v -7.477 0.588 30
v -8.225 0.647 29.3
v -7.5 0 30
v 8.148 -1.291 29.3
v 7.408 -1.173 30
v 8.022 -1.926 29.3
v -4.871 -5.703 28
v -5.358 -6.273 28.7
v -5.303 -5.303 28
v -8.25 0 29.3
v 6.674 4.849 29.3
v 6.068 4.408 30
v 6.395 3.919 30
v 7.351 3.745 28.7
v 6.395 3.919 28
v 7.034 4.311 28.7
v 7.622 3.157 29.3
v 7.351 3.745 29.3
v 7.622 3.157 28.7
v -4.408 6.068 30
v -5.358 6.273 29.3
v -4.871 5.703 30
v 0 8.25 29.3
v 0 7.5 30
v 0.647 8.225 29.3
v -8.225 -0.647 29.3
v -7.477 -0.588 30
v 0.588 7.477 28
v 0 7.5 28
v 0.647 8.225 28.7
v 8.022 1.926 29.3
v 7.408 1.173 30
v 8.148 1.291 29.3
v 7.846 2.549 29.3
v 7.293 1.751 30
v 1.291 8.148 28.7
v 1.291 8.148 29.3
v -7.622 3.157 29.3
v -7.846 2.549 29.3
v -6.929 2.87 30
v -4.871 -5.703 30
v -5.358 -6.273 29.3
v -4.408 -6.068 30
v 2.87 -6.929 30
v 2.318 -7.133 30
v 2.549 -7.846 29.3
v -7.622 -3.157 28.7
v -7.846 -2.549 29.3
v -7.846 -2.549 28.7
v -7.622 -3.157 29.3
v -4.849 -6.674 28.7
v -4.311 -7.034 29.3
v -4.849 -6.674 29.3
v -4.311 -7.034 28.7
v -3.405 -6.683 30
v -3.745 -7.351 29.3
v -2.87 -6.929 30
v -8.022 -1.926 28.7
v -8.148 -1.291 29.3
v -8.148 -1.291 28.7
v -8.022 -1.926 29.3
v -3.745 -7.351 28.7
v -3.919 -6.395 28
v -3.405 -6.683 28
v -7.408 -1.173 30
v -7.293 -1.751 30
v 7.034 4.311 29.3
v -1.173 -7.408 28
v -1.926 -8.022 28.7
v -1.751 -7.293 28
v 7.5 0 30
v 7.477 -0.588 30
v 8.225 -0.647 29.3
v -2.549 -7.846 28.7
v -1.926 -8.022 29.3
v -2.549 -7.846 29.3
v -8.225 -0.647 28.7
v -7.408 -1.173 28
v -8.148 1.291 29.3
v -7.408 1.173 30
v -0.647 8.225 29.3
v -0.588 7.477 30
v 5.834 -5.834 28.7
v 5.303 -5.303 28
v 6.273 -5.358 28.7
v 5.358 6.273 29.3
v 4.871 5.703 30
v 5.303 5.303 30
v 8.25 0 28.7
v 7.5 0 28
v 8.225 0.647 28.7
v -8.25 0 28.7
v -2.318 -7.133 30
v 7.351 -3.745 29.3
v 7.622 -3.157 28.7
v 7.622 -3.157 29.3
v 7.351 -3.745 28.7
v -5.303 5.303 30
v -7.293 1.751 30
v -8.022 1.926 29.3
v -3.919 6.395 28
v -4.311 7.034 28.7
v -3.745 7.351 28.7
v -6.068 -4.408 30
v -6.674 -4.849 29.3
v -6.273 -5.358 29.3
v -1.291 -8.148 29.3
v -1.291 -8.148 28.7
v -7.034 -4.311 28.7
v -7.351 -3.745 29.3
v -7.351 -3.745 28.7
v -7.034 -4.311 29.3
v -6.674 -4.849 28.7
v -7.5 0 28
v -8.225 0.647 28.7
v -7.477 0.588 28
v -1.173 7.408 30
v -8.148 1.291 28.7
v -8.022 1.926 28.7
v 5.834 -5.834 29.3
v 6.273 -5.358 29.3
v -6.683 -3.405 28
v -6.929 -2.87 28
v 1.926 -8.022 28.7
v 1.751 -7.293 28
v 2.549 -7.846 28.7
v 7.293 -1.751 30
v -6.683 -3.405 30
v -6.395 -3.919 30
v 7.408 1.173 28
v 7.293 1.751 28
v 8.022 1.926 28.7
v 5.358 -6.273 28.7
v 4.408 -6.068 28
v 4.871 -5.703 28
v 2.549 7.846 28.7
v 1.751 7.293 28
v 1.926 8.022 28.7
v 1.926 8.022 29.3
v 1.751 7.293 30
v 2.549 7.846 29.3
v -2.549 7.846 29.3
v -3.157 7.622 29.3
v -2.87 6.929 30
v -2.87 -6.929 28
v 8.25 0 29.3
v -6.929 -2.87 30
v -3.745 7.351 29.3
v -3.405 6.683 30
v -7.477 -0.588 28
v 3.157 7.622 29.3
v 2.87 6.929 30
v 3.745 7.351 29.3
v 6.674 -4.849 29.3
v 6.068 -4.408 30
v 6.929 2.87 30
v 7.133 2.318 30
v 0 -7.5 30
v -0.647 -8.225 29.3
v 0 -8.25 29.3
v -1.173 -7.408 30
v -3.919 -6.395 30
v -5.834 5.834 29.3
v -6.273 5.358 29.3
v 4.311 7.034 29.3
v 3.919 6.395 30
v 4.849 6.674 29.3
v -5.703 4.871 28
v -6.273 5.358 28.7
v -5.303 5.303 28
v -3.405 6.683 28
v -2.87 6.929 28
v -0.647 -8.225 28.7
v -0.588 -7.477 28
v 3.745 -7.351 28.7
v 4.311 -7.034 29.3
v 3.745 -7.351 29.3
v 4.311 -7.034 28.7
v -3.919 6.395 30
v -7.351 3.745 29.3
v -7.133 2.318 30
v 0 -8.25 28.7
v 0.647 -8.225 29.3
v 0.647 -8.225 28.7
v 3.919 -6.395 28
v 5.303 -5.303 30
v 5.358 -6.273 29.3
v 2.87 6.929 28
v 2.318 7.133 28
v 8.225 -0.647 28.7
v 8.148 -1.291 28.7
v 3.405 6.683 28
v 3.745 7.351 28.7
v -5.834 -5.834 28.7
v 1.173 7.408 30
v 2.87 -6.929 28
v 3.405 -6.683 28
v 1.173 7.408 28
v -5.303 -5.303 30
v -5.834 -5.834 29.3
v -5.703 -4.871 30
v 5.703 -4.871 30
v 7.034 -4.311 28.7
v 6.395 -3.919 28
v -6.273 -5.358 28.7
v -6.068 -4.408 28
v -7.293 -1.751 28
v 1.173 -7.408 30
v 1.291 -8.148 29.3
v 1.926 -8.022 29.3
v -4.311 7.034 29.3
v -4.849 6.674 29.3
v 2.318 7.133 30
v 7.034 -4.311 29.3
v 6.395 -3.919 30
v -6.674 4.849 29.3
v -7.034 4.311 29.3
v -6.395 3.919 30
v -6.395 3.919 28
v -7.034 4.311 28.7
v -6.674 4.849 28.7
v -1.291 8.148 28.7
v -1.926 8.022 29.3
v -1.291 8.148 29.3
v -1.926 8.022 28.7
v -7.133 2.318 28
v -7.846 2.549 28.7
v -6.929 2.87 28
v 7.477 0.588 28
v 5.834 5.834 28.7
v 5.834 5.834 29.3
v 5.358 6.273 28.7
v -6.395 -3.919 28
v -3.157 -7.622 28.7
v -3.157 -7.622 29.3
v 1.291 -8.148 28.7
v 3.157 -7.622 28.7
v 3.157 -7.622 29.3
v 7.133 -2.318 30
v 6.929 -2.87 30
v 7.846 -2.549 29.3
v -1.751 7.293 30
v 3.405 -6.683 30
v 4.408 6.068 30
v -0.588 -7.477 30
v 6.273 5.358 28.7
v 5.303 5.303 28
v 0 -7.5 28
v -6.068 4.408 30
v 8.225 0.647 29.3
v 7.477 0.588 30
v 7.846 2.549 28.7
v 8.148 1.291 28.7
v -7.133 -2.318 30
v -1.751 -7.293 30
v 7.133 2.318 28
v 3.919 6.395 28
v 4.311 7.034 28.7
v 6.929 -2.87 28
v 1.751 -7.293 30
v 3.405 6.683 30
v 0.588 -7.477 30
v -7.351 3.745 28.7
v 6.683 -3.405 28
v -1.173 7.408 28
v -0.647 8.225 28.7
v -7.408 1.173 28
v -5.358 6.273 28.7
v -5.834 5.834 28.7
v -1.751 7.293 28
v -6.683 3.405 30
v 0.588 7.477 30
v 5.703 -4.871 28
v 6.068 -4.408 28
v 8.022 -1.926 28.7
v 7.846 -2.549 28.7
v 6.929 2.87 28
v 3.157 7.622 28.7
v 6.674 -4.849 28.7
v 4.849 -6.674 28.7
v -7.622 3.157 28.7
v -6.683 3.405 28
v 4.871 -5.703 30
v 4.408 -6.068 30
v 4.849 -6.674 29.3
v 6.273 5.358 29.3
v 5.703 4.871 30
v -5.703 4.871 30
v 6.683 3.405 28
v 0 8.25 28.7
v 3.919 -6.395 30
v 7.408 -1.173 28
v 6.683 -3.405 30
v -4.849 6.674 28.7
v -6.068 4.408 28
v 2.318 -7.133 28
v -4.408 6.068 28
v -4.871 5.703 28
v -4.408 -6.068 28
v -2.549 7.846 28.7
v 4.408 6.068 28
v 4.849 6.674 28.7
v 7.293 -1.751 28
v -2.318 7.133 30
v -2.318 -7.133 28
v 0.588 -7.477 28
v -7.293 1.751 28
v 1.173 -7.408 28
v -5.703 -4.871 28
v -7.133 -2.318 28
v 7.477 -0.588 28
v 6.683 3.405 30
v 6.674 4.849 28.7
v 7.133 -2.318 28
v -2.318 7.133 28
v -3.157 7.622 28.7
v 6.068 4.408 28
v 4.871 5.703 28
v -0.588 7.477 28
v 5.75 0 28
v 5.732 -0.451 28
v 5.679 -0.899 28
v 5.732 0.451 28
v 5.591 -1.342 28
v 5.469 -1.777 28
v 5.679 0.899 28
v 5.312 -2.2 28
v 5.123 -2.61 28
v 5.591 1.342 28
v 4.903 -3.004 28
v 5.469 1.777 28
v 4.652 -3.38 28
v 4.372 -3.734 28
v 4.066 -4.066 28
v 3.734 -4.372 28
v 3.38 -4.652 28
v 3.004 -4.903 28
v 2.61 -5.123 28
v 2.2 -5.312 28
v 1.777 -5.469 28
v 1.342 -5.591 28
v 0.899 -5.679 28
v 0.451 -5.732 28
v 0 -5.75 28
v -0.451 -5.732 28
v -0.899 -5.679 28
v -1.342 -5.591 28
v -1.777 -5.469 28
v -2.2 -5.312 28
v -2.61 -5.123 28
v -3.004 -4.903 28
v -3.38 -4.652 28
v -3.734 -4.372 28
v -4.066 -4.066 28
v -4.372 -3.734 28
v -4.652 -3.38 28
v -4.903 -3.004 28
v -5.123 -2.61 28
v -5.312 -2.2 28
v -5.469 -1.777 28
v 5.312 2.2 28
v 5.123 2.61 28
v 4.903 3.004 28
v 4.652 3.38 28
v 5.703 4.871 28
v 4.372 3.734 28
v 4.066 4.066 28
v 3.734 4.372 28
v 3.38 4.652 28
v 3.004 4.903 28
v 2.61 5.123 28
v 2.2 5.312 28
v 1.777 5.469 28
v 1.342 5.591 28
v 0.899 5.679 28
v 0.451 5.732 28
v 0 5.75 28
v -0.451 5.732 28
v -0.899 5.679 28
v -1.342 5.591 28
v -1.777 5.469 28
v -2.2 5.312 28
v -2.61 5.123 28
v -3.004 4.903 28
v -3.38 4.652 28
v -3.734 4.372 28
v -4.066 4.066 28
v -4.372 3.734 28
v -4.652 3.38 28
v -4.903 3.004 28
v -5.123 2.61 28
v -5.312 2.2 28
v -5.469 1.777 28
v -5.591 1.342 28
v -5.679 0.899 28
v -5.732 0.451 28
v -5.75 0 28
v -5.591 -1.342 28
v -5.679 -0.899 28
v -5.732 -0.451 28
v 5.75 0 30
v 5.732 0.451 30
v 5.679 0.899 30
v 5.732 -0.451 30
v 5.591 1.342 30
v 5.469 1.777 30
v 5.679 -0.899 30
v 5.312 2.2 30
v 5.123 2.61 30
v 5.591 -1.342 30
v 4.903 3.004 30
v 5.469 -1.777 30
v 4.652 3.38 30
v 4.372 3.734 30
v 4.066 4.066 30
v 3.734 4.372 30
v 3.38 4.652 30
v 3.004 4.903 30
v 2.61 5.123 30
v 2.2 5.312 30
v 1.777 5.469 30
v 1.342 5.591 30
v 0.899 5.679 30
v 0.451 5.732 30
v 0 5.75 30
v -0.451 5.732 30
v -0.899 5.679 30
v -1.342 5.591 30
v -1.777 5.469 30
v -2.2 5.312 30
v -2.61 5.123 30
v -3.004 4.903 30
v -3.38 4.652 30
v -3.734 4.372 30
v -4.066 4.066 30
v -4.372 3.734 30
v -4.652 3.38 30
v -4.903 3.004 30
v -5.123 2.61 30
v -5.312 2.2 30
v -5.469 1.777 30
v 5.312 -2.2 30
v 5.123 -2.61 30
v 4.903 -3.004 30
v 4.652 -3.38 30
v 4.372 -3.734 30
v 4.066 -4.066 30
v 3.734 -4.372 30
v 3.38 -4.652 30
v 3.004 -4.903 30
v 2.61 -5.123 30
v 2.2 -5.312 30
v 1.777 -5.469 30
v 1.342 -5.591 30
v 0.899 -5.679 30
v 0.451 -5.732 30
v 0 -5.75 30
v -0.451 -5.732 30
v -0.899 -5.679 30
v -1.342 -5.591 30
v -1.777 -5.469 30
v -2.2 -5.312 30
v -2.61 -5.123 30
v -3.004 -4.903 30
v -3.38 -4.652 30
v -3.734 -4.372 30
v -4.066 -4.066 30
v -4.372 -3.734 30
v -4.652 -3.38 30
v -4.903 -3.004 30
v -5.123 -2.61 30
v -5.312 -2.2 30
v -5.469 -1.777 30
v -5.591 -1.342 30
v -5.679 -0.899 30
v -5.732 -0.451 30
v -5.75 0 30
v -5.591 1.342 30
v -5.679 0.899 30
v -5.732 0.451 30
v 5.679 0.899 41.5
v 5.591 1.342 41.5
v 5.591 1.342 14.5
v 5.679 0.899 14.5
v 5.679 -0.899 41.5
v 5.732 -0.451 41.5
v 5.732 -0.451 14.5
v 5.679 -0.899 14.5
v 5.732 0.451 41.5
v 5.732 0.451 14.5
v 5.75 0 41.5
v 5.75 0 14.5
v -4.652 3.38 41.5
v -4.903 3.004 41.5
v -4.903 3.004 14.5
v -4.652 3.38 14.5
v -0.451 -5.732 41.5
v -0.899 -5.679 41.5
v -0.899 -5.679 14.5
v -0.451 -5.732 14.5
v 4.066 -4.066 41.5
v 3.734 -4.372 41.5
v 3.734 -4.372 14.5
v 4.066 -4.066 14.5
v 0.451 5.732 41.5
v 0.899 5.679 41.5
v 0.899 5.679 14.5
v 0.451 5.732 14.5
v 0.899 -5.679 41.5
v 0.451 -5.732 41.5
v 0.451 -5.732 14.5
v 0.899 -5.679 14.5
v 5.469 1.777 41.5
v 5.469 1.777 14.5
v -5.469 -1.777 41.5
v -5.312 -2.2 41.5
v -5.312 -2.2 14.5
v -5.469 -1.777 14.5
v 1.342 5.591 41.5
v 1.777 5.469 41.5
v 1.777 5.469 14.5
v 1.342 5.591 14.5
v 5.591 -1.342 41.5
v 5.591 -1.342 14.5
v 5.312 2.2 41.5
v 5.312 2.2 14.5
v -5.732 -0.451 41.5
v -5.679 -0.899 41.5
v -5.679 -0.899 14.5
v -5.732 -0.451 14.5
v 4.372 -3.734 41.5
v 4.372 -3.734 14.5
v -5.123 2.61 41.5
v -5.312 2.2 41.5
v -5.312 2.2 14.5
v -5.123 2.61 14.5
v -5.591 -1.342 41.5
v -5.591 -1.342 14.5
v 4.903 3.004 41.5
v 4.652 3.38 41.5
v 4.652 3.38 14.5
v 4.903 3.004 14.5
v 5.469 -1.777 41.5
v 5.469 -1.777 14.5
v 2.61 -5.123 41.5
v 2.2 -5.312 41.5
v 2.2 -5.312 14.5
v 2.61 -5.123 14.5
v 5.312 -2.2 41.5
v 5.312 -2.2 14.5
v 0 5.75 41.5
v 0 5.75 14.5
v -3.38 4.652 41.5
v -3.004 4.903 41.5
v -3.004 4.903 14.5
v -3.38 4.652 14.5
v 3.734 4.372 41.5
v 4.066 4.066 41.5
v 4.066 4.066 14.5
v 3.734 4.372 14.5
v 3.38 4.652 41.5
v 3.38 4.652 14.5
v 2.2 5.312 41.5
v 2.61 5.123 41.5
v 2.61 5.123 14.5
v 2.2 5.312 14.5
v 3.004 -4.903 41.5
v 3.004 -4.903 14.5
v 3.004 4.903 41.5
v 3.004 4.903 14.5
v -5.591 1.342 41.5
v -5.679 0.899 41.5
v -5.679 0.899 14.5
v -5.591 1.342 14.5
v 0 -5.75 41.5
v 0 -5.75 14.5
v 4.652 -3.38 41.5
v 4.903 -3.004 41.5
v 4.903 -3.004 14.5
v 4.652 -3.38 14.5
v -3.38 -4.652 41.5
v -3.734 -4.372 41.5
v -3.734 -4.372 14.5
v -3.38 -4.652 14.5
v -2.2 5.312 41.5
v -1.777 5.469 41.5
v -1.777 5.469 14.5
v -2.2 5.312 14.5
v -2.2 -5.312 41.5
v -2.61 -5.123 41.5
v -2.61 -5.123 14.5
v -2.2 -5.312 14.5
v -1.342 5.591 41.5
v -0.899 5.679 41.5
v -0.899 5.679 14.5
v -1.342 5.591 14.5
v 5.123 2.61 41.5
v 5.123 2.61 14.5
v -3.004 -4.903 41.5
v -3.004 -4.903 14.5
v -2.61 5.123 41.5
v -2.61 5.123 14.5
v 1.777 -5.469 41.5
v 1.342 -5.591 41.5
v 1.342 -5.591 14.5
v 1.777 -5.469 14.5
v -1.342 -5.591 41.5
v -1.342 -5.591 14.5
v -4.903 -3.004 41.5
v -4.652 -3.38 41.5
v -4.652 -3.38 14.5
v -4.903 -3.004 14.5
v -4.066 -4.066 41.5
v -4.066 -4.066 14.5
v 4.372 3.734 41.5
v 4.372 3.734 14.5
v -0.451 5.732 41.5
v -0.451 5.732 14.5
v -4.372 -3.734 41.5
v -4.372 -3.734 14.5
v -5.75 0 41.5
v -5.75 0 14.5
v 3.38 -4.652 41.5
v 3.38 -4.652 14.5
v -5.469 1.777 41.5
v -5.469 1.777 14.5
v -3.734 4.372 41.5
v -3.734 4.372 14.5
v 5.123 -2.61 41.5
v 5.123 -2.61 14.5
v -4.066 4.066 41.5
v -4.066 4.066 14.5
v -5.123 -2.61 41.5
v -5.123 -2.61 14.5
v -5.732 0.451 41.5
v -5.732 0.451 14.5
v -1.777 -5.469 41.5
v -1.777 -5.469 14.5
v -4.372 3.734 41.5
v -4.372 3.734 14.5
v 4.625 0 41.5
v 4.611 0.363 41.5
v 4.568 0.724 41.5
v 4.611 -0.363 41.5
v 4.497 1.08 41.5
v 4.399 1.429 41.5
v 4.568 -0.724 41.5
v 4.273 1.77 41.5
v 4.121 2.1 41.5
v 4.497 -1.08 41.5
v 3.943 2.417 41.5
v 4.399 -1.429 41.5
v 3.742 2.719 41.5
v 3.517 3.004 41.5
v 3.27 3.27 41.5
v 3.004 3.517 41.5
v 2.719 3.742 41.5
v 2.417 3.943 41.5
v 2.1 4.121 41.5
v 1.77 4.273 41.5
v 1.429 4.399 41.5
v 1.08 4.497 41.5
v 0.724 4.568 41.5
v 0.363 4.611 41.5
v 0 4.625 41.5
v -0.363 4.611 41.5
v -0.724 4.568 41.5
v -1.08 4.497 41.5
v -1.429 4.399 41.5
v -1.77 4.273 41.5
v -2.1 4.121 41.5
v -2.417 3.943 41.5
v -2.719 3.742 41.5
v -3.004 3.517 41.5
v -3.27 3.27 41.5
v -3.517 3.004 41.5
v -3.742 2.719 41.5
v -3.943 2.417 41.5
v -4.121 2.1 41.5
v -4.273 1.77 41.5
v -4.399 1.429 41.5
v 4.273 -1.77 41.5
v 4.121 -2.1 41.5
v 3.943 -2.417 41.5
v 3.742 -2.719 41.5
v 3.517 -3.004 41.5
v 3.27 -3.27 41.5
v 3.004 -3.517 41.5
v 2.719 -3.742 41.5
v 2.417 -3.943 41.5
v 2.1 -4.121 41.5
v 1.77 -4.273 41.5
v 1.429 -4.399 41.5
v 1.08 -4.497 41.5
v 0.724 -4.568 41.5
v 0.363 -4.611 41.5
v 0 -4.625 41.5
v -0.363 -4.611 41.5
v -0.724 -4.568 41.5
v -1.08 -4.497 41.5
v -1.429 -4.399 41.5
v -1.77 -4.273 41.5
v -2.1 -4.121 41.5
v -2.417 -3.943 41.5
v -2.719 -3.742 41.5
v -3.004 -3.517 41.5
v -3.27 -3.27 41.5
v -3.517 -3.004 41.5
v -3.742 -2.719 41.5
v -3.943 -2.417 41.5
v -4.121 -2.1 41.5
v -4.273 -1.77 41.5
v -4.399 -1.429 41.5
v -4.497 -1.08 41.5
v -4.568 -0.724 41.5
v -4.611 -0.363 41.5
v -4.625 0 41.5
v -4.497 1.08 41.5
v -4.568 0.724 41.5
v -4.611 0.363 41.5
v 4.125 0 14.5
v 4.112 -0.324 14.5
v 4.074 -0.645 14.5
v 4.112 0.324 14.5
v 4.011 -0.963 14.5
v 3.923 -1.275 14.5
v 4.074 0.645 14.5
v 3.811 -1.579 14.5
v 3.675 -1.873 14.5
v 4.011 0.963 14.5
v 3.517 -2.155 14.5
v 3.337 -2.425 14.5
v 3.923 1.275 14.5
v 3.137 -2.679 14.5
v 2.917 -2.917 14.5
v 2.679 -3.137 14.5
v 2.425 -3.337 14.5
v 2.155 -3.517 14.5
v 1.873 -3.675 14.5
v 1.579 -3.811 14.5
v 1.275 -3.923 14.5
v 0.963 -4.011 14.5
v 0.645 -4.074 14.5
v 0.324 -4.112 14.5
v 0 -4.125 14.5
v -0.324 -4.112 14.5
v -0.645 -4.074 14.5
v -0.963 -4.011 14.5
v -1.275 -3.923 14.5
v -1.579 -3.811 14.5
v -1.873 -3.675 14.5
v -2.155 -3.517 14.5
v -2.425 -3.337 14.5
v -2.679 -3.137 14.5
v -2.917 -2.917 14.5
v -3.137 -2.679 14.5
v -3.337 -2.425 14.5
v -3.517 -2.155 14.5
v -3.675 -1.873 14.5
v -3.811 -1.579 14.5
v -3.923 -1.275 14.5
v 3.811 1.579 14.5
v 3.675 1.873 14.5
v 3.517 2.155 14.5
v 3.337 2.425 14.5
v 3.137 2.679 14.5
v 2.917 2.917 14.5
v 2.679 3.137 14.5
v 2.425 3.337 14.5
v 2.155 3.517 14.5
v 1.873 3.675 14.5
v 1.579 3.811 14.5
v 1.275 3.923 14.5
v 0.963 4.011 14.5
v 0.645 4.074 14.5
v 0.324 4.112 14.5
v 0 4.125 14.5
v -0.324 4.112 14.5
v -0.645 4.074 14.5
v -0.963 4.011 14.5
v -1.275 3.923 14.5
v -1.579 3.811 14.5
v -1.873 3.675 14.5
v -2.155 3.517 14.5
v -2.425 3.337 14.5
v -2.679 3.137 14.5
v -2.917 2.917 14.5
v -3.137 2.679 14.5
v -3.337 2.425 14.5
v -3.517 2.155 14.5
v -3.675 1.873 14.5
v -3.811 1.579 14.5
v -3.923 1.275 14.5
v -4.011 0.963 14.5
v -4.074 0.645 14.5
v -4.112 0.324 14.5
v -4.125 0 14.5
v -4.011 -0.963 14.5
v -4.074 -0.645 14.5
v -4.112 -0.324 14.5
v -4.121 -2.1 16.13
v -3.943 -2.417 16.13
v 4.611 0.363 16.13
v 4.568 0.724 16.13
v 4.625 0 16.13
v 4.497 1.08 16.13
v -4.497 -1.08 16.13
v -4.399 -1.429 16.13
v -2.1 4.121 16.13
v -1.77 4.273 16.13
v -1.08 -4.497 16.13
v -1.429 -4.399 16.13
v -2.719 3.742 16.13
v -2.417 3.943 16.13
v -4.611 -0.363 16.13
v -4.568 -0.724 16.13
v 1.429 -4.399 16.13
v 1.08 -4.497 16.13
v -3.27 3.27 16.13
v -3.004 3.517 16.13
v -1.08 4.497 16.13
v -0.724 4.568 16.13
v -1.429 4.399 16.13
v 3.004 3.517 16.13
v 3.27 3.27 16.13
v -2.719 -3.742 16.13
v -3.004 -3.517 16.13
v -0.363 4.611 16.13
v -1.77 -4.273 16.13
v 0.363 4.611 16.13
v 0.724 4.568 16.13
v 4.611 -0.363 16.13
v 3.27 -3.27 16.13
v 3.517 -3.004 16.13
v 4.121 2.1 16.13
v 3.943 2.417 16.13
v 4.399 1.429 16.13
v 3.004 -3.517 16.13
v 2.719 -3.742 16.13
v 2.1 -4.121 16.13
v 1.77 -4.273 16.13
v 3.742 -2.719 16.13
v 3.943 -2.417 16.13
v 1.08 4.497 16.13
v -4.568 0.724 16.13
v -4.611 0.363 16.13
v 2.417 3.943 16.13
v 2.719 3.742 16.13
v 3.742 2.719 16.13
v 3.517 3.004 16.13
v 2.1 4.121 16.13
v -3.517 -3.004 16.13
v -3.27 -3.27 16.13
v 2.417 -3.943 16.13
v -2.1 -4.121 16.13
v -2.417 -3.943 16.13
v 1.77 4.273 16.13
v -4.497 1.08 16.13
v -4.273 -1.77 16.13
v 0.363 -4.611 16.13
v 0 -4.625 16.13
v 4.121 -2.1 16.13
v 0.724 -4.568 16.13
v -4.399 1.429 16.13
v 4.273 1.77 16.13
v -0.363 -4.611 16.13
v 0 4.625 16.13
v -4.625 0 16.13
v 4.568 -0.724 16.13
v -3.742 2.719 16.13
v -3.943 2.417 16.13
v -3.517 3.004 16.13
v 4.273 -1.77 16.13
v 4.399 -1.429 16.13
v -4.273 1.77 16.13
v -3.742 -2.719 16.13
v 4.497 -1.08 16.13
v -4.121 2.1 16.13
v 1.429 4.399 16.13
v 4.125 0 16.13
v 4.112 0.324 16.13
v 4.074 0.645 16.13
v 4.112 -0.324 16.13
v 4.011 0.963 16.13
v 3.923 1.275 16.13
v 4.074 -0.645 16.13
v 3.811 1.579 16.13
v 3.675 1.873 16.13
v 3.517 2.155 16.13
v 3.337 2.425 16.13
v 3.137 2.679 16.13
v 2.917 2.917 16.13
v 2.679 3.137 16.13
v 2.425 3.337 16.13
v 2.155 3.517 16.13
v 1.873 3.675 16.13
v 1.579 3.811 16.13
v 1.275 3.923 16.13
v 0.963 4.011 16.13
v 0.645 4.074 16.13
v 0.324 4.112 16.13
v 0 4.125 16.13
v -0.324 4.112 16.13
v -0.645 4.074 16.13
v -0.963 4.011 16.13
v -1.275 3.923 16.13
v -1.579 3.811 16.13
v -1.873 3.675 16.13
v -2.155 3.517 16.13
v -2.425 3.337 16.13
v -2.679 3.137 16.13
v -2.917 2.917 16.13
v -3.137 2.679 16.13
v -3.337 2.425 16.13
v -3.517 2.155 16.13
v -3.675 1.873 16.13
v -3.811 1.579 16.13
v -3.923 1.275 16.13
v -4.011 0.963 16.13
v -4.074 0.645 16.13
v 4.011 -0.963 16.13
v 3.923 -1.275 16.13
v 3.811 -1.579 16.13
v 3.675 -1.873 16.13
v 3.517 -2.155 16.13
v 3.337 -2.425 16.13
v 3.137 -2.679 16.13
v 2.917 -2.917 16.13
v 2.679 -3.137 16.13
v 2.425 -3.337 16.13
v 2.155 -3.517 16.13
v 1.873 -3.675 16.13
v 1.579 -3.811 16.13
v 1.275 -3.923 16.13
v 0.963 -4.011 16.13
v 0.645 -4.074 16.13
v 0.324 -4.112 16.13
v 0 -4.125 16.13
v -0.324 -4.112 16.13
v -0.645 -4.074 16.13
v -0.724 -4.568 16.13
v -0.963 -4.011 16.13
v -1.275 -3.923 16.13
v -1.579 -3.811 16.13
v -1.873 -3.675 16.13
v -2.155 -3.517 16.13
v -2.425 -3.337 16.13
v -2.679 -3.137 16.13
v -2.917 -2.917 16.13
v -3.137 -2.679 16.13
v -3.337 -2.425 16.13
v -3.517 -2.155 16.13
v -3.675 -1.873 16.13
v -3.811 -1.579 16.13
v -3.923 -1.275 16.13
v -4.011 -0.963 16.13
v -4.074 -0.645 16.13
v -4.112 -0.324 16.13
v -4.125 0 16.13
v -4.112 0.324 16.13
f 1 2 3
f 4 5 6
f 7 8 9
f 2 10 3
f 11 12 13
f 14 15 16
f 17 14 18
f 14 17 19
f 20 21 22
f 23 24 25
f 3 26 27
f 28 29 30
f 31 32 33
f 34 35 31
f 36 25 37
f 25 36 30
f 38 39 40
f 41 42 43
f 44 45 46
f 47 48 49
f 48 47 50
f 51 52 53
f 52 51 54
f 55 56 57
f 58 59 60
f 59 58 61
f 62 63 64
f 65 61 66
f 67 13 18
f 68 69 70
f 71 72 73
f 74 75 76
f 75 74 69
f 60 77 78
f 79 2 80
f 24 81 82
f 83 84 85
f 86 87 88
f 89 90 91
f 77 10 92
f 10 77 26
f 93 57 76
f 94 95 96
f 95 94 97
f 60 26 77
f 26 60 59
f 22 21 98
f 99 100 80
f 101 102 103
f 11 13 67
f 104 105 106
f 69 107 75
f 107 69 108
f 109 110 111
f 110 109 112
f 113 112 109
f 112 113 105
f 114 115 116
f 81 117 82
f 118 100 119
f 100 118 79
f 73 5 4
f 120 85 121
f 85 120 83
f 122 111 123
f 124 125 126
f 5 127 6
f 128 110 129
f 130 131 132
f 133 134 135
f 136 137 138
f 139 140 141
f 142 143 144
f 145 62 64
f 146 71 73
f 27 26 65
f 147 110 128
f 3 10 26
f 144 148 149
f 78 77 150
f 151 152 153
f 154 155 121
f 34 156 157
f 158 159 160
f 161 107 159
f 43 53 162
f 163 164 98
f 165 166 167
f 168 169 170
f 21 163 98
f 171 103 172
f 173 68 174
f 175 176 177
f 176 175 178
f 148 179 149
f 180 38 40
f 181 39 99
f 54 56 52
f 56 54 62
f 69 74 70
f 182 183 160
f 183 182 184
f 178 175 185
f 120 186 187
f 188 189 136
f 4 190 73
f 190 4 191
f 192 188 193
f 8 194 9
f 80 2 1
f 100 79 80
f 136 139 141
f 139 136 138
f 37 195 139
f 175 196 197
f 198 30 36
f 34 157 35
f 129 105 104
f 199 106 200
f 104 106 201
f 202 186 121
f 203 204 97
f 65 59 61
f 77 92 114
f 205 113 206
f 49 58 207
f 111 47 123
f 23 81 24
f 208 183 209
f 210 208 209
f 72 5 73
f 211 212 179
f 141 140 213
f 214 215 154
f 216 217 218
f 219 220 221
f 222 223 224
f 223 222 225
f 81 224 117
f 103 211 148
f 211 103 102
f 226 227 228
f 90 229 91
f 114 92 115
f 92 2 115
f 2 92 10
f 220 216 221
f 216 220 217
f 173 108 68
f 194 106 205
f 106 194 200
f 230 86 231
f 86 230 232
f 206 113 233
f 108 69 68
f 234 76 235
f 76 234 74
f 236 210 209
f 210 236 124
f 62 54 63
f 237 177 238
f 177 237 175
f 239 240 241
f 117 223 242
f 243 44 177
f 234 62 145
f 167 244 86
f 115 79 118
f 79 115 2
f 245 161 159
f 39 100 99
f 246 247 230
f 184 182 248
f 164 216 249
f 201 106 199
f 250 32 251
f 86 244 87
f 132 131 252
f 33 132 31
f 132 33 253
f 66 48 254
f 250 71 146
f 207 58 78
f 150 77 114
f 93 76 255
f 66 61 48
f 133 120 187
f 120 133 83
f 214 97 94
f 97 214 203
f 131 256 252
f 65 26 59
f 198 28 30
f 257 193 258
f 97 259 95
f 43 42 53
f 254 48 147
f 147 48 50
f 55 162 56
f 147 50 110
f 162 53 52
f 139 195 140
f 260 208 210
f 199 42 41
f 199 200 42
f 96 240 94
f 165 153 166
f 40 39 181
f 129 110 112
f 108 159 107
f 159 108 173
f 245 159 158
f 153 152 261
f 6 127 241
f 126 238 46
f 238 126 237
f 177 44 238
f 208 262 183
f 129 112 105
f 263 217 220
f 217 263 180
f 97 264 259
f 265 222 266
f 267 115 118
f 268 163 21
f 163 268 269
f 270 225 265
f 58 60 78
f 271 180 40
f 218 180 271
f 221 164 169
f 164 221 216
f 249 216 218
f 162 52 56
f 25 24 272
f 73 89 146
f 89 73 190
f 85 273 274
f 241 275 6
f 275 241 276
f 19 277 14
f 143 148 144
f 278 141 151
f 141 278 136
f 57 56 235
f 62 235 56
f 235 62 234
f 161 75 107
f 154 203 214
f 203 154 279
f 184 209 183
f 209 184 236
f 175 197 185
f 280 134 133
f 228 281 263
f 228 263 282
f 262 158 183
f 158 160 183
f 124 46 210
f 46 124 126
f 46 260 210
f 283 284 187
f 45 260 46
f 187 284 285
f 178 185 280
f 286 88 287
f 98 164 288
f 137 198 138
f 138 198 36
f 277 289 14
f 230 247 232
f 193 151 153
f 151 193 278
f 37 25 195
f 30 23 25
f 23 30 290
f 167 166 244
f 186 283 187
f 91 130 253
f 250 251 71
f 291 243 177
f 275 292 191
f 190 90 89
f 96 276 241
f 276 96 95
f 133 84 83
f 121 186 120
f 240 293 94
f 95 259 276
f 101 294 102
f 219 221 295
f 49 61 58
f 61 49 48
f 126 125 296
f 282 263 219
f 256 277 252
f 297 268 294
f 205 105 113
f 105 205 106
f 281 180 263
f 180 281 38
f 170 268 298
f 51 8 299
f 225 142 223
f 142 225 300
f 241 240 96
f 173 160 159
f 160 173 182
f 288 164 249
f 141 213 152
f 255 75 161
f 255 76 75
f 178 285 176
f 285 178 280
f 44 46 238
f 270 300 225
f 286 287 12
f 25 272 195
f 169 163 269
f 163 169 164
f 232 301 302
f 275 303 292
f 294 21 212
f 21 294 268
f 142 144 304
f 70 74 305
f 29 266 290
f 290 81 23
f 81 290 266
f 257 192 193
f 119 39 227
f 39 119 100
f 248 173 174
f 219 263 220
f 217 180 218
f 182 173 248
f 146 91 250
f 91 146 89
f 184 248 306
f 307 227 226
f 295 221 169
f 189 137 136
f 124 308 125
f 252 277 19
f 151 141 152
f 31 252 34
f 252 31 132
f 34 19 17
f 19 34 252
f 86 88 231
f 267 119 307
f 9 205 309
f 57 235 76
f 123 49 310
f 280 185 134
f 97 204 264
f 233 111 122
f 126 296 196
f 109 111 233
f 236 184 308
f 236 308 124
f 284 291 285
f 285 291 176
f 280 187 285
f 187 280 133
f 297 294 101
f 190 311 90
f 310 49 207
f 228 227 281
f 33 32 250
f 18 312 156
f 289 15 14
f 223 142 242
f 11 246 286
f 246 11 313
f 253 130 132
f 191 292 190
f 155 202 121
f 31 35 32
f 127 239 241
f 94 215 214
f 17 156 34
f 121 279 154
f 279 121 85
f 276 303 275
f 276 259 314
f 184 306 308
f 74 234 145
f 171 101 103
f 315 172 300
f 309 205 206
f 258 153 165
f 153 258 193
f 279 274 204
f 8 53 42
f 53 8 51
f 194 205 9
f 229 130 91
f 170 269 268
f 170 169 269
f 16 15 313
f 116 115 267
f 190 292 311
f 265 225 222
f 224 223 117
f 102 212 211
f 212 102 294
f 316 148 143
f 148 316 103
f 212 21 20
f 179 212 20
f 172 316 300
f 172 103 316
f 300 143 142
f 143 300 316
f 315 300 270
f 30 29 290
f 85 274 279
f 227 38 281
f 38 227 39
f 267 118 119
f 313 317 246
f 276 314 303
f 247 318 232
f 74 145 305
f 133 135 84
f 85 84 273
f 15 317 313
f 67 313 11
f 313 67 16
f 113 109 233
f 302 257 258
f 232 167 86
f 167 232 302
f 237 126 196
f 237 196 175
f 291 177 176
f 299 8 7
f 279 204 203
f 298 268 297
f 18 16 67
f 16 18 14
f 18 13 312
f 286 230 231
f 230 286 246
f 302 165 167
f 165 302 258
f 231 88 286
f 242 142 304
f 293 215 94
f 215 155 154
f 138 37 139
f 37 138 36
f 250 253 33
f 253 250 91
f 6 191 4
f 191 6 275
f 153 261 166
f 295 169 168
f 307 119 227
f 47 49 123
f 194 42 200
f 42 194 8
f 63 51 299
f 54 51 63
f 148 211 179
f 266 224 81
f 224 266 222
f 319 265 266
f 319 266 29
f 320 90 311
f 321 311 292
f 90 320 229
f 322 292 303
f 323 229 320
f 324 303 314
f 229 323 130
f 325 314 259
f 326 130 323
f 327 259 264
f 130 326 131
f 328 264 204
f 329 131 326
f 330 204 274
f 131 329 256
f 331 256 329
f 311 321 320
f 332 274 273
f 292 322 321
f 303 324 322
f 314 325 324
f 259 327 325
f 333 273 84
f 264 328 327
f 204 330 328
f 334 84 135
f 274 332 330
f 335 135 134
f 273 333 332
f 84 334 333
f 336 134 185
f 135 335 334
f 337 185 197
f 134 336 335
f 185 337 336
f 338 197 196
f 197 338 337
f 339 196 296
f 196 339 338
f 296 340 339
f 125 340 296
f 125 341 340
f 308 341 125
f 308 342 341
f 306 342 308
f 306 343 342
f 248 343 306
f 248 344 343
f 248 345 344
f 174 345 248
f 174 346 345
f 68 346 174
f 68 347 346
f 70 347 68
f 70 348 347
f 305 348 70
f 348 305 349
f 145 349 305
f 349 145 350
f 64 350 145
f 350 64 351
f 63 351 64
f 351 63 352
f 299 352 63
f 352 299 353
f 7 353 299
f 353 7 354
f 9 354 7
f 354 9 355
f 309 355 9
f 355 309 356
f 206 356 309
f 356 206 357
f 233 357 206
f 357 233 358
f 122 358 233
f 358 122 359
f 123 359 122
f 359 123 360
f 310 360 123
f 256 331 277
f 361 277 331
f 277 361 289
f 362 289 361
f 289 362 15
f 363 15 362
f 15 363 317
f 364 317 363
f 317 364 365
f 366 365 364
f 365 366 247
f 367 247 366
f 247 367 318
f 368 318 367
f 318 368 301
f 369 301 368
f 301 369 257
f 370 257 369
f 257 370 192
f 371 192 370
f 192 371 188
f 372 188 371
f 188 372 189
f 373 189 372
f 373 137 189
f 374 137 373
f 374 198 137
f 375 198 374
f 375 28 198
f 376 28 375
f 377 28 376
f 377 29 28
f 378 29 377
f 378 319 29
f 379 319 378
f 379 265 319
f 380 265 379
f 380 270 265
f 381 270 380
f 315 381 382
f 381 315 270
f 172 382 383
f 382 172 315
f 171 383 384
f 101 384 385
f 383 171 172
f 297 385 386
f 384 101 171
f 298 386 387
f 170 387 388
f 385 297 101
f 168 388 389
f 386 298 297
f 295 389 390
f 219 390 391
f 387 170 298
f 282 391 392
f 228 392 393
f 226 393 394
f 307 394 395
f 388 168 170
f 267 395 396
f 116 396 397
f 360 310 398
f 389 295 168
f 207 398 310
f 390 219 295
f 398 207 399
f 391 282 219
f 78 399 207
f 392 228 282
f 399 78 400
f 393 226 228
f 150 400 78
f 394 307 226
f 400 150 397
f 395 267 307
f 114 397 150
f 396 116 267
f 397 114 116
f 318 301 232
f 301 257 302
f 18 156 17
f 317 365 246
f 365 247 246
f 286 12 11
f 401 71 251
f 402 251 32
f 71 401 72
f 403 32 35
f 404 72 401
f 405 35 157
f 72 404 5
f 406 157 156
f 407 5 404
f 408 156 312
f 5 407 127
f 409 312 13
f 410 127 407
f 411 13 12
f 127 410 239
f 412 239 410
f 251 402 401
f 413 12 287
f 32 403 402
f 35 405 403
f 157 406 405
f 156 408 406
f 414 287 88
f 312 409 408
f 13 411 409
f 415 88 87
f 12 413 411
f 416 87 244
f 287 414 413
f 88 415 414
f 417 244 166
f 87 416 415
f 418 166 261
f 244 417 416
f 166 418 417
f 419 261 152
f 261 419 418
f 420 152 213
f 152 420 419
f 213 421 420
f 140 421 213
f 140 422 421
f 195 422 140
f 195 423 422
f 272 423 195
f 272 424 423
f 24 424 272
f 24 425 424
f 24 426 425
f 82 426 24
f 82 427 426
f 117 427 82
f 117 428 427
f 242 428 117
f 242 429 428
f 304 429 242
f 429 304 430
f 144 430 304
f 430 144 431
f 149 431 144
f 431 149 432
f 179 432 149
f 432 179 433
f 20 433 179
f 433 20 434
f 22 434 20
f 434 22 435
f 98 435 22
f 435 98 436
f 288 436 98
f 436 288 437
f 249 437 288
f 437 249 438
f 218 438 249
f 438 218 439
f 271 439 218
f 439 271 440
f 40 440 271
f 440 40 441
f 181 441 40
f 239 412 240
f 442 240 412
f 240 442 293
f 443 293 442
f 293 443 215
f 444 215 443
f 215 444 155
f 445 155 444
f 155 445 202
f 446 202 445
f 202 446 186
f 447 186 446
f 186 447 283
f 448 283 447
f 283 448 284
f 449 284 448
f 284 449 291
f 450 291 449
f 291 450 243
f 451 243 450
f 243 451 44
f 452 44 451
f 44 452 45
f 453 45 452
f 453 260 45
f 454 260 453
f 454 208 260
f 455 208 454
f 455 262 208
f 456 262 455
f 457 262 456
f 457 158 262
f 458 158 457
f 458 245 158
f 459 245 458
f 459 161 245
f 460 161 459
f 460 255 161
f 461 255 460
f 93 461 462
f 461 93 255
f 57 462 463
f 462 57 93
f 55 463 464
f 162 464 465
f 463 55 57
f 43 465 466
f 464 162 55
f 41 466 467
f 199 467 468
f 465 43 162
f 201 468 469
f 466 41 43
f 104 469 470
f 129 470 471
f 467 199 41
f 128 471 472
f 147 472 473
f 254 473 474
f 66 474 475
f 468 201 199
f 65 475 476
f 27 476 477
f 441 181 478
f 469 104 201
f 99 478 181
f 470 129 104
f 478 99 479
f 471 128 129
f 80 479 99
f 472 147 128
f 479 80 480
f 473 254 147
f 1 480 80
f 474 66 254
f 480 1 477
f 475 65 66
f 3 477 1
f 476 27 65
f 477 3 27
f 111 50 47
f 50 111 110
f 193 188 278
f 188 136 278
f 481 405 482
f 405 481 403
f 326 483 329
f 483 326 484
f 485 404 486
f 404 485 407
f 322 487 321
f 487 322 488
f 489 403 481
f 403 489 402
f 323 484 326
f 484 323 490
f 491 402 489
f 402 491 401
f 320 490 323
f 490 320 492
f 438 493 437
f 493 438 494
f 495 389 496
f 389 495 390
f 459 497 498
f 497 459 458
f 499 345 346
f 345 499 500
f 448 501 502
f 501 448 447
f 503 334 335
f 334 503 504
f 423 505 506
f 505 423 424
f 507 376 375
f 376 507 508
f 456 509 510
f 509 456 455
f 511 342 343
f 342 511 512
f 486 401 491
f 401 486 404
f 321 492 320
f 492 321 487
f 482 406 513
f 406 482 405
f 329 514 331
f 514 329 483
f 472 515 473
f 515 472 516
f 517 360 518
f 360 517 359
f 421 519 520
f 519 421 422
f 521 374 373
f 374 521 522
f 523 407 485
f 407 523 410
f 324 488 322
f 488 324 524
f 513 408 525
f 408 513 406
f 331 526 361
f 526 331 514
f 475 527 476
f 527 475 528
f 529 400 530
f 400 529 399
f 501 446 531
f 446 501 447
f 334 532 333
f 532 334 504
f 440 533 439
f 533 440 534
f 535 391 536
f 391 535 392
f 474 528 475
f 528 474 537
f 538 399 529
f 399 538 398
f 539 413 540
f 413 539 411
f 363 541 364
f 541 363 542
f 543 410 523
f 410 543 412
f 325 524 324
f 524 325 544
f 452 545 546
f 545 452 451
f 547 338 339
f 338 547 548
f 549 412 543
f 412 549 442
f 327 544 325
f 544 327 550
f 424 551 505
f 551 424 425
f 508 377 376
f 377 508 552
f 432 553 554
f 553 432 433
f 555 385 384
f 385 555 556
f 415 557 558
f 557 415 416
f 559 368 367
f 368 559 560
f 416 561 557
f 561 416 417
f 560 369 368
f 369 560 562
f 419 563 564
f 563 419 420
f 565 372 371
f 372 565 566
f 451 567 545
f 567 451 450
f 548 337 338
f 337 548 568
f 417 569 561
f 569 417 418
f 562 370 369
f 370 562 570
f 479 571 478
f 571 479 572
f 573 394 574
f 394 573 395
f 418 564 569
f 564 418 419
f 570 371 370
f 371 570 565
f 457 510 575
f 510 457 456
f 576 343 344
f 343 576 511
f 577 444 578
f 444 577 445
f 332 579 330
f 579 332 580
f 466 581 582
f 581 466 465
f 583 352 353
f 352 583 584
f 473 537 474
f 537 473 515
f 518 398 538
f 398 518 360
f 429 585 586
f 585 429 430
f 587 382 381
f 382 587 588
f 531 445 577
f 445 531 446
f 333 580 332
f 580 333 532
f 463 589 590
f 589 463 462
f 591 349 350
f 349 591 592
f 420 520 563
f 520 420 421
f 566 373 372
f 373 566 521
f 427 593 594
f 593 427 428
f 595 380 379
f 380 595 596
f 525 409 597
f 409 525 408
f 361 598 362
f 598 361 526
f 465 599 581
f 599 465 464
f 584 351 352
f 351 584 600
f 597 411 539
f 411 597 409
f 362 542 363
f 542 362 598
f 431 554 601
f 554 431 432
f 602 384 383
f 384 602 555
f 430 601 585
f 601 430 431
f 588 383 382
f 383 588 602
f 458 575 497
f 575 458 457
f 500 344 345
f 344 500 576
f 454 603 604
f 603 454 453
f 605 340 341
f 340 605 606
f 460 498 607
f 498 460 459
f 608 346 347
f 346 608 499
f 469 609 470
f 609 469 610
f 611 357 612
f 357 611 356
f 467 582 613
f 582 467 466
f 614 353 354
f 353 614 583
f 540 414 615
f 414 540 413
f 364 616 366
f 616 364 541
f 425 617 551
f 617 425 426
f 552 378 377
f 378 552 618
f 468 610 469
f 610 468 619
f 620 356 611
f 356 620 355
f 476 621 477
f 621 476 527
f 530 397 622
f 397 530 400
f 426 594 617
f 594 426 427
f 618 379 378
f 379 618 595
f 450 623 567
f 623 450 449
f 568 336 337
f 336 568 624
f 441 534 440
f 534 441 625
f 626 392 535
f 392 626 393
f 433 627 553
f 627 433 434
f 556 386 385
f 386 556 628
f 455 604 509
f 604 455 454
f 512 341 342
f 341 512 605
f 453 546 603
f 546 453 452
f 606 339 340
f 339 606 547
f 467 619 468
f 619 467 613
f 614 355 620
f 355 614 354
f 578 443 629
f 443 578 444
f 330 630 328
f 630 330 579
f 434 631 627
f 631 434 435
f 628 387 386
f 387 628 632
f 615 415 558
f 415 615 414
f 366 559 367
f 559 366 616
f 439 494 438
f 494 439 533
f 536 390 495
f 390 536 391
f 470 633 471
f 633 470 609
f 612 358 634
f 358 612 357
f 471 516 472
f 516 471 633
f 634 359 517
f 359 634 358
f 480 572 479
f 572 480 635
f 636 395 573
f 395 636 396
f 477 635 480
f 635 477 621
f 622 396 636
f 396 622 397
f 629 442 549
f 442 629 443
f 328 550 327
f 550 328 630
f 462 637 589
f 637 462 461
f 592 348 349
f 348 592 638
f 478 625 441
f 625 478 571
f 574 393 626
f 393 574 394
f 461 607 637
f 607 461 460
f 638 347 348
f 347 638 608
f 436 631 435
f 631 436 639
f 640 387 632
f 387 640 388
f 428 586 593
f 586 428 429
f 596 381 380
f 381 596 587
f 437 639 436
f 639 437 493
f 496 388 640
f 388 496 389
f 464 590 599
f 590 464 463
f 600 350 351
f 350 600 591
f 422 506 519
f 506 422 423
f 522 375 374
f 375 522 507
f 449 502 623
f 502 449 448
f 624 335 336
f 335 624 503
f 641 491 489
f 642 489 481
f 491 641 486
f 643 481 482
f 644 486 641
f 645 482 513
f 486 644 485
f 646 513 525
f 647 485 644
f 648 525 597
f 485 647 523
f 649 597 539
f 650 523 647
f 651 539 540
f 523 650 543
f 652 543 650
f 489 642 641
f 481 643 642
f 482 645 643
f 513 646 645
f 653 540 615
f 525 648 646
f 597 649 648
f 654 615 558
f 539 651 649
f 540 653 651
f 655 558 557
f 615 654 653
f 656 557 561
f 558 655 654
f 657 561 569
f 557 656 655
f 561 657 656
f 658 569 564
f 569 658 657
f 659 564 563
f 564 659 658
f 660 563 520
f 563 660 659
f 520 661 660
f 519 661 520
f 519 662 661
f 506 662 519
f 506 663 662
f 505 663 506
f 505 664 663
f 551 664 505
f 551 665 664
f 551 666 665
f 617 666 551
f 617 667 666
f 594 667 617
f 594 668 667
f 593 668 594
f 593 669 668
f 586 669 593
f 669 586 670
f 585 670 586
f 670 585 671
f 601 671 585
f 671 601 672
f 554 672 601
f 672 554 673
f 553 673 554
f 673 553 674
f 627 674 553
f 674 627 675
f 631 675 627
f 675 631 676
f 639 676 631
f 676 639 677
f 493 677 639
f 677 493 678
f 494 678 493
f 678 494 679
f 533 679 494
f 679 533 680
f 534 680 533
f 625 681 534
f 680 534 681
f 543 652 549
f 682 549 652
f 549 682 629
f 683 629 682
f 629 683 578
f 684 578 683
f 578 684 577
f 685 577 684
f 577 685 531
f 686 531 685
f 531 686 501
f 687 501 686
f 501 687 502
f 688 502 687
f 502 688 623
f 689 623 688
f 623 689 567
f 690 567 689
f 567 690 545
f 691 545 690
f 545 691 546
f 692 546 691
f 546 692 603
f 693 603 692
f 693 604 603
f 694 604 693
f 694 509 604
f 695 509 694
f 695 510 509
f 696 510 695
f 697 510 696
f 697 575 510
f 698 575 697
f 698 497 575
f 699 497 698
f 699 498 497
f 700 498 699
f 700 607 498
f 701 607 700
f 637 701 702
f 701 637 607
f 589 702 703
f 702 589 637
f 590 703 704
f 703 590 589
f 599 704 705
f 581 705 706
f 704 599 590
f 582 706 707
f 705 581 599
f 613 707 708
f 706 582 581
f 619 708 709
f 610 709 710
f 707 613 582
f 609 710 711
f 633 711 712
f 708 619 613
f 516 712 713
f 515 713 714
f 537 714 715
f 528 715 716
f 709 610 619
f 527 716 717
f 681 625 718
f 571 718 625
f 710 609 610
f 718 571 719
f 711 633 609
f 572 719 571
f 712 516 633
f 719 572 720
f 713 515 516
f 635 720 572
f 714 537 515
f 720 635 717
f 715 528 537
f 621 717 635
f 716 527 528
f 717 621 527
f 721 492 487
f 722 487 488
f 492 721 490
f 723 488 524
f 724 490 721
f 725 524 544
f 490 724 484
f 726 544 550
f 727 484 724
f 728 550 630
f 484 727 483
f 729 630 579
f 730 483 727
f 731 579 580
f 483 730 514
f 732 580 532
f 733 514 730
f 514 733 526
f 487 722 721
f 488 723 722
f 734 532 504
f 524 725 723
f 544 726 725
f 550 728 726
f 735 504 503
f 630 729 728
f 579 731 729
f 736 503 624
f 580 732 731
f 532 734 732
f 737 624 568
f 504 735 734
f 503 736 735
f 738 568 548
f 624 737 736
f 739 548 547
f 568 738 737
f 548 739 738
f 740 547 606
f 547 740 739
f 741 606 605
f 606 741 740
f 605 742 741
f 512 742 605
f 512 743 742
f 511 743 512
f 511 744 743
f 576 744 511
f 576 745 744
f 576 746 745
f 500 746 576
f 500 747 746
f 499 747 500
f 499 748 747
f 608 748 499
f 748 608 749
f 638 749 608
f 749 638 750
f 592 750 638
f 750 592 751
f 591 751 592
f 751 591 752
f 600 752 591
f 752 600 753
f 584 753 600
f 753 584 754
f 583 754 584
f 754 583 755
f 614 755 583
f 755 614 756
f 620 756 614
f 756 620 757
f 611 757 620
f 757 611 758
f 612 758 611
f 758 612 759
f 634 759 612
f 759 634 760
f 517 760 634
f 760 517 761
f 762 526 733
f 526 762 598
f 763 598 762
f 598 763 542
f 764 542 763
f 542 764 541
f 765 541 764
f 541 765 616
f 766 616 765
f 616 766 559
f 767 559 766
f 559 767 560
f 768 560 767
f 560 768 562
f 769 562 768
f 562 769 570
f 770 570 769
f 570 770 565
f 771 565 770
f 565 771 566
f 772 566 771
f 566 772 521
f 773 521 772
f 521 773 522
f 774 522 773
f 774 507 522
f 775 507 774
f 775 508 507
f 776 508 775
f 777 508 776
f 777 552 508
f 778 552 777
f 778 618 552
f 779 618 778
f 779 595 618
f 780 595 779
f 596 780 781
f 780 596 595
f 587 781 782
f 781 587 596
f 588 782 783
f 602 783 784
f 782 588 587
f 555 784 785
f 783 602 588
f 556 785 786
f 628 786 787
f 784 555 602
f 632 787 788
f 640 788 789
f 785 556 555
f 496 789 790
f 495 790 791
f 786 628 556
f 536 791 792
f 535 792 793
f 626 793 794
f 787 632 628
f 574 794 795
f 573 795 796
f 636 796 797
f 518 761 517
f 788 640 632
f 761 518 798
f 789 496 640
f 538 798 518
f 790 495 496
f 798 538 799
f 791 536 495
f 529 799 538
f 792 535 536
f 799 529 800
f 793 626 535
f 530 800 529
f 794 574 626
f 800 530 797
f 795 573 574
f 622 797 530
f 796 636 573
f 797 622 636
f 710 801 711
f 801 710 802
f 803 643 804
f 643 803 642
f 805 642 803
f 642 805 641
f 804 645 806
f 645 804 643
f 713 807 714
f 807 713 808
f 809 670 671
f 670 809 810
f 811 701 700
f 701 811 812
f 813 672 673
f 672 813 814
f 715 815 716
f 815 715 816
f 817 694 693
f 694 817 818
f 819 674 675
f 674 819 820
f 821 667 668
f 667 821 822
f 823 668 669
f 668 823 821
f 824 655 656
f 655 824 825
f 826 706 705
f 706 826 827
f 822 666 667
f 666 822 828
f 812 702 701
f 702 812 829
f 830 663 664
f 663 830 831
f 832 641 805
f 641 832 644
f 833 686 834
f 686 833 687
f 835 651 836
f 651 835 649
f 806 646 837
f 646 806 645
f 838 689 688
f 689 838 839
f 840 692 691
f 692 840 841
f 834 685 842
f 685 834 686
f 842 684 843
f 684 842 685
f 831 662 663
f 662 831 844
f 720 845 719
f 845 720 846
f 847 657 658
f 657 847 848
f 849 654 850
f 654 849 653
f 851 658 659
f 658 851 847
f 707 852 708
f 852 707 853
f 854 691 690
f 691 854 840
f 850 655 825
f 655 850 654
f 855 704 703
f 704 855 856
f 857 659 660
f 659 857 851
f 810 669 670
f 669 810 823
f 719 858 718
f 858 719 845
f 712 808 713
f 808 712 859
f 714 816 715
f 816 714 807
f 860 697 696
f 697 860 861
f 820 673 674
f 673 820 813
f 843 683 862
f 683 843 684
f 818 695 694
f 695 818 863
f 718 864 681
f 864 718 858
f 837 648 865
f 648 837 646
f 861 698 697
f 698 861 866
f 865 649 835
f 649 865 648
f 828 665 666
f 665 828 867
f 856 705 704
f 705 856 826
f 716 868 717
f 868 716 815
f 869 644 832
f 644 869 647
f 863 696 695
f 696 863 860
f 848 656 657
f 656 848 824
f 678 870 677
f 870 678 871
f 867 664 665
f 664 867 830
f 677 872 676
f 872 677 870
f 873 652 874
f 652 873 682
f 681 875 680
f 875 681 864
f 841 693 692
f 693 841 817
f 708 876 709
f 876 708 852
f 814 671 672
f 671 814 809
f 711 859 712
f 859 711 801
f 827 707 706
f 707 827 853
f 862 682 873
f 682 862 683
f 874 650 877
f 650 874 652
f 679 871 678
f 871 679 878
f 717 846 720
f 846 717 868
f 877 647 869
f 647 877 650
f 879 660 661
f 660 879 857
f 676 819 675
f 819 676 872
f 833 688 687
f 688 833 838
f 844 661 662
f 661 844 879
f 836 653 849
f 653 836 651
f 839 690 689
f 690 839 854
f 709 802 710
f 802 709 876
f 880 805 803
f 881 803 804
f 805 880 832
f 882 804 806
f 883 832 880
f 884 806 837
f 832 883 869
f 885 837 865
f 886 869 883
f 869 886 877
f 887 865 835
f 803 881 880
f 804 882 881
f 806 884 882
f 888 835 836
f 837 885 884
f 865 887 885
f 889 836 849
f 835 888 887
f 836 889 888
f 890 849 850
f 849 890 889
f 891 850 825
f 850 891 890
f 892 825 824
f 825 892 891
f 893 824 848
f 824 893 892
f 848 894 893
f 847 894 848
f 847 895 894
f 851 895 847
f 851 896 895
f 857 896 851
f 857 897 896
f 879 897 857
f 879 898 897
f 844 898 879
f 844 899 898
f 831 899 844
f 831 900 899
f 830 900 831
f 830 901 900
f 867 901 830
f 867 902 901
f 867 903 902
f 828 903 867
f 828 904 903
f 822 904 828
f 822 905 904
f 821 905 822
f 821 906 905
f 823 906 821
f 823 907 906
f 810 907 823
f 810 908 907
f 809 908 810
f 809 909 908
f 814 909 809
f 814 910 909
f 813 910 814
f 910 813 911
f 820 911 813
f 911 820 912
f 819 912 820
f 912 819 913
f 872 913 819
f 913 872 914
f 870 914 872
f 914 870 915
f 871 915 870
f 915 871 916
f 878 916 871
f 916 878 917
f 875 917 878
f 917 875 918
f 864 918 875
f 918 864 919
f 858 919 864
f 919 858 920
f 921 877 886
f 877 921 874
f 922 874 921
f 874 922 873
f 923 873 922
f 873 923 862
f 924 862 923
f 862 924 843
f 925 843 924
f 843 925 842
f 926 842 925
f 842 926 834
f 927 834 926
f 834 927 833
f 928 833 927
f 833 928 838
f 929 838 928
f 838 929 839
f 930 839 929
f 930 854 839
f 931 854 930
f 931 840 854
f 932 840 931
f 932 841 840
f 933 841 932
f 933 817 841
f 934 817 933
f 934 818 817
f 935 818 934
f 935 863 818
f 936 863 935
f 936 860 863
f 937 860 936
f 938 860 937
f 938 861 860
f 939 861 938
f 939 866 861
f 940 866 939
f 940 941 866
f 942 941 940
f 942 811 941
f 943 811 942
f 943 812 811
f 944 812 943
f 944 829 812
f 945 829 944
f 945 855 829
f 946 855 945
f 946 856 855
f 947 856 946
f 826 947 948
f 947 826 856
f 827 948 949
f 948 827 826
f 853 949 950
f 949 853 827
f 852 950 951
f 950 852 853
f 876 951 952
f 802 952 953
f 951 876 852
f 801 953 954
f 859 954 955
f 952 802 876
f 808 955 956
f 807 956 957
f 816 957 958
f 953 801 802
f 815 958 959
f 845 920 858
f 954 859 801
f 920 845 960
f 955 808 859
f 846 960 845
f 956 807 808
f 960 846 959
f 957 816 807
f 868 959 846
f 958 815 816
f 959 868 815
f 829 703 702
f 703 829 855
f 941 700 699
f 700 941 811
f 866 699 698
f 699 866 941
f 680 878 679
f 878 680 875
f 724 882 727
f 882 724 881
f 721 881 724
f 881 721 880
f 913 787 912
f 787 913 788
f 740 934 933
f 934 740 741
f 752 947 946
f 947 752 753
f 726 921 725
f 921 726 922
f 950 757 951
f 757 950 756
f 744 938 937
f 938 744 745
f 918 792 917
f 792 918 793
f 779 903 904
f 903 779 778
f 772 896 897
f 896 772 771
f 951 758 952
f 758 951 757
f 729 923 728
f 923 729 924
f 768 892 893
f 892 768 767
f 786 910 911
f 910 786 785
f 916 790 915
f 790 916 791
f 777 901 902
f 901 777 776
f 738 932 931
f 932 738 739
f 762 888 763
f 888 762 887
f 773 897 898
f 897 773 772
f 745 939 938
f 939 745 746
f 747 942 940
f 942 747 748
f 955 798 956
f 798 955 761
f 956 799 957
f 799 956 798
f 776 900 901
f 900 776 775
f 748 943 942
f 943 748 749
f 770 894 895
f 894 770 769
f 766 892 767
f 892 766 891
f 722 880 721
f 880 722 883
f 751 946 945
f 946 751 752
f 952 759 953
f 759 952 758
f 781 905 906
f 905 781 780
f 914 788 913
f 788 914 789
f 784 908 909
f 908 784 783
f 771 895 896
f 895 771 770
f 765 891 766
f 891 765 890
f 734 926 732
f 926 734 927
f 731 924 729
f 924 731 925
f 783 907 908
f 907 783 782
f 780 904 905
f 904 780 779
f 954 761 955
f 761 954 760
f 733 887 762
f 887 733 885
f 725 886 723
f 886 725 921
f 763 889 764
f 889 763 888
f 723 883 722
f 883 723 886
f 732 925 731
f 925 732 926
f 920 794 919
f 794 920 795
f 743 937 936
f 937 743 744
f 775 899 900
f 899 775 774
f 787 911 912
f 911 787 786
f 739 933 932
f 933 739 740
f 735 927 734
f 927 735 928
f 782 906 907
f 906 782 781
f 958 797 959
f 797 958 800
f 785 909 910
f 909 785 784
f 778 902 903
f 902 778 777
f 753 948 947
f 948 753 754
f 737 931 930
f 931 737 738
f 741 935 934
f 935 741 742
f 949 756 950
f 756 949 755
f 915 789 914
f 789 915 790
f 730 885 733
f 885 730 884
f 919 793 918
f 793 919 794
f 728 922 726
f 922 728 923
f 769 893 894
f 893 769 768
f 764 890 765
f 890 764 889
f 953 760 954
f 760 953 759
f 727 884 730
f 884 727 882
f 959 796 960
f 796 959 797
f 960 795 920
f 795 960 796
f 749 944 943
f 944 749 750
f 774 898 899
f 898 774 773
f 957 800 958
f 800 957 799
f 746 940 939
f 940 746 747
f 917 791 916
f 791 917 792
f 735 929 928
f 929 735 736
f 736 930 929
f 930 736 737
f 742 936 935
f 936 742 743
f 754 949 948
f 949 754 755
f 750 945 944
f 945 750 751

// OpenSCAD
// file: plotter_pen_adapters_common.scad
// Measurements and routines common across adapters.

band_full_thickness = 2;    // thickest point of the band
band_edge_thickness = 0.6;  // thinnest point of the band
band_full_diameter = 16.5;  // diameter at widest point of band
band_edge_diameter = 15;    // diameter where band starts to angle in

band_to_paper = 28 ;

band_to_body_tapering = 11 ; 

body_taper = 5 ; //fake value ;

band_profile = [
    [0,0],
    [band_edge_diameter / 2, 0],
    [band_full_diameter / 2, (band_full_thickness - band_edge_thickness) / 2],
    [band_full_diameter / 2, band_full_thickness - ((band_full_thickness - band_edge_thickness) / 2)],
    [band_edge_diameter / 2, band_full_thickness],
    [0,band_full_thickness],
];

module band() {
    rotate_extrude($fn=80) polygon(points=band_profile);
}



//-- Original HP plotter pen, which now serves as a body for the actual pen
 
BodyOutline = [                     // X values = (measured diameter)/2, Y as distance from tip
    [0.0,0.0],                      //  0 fiber pen tip
//  [2.0/2,1.4],                    //  1 ... taper (not buildable)
    [1.0/2,0.005],                  //  1 ... faked point to remove taper
    [2.0/2,0.0],[2.0/2,2.7],        //  2 ... cylinder
    [3.7/2,2.7],[3.7/2,4.45],       //  4 tip surround
    [4.8/2,5.2],                    //  6 chamfer
    [6.5/2,11.4],                   //  7 rubber seal face
    [8.9/2,11.4],                   //  8 cap seat
    [11.2/2,15.9],                  //  9 taper to body
    [11.5/2,28.0],                  // 10 lower body
    [13.2/2,28.0],[16.6/2,28.5],    // 11 lower flange = 0.5
    [16.6/2,29.5],[13.2/2,30.0],    // 13 flange rim = 1.0
    [11.5/2,30.0],                  // 15 upper flange = 0.5
    [11.5/2,43.25],                 // 16 upper body
    [0.0,43.25]                     // 17 lid over reservoir
    ];
    
    
    
 //-- HP plotter pen body
 
module Body() {
    render(convexity=3)
        rotate_extrude($fn=50)
            polygon(points=BodyOutline);
}

    
// main file
// Plotter pen adapter for Muji black 0.5 pen
// 
// Refactored by Julien Dorra
// Original code by Sasha Kovar <sasha-thing@arcocene.org>
// from a design by Brian Boucheron <brian@boucheron.org>

include <plotter_pen_adapters_common.scad>;

adapter_outer_diameter = 11.5; // outer diameter of the main body

pen_top_diameter = 9.25; 
pen_bottom_diameter = 8.25; //make it smaller to stop the pen. Might not be needed if you just want the pen to press down thanks to gravity

pen_height_of_diameter_change = 16.13 ; // this is usually the body/cap limit on the body of the pen

adapter_height_above_band = 13.5;
adapter_height_below_band = 13.5;

module adapter_body () {
translate([0,0,band_to_paper])  
    union() {
        band();
        cylinder(r=adapter_outer_diameter/2, h=adapter_height_above_band, $fn=80);
        
        translate([0,0,-adapter_height_below_band]) 
            cylinder(r=adapter_outer_diameter/2, h=adapter_height_below_band, $fn=80);
    }
    }

//
    
difference() {
    
        color ("white") adapter_body () ;
       
        color ("red") translate([0,0,pen_height_of_diameter_change])     
                cylinder(r=pen_top_diameter/2, 
                         h= adapter_height_above_band + adapter_height_below_band, 
                         $fn=80);
        
       color ("blue") translate([0,0,0]) 
                cylinder(r=pen_bottom_diameter/2, 
                         h=pen_height_of_diameter_change, 
                         $fn=80);
        
}
